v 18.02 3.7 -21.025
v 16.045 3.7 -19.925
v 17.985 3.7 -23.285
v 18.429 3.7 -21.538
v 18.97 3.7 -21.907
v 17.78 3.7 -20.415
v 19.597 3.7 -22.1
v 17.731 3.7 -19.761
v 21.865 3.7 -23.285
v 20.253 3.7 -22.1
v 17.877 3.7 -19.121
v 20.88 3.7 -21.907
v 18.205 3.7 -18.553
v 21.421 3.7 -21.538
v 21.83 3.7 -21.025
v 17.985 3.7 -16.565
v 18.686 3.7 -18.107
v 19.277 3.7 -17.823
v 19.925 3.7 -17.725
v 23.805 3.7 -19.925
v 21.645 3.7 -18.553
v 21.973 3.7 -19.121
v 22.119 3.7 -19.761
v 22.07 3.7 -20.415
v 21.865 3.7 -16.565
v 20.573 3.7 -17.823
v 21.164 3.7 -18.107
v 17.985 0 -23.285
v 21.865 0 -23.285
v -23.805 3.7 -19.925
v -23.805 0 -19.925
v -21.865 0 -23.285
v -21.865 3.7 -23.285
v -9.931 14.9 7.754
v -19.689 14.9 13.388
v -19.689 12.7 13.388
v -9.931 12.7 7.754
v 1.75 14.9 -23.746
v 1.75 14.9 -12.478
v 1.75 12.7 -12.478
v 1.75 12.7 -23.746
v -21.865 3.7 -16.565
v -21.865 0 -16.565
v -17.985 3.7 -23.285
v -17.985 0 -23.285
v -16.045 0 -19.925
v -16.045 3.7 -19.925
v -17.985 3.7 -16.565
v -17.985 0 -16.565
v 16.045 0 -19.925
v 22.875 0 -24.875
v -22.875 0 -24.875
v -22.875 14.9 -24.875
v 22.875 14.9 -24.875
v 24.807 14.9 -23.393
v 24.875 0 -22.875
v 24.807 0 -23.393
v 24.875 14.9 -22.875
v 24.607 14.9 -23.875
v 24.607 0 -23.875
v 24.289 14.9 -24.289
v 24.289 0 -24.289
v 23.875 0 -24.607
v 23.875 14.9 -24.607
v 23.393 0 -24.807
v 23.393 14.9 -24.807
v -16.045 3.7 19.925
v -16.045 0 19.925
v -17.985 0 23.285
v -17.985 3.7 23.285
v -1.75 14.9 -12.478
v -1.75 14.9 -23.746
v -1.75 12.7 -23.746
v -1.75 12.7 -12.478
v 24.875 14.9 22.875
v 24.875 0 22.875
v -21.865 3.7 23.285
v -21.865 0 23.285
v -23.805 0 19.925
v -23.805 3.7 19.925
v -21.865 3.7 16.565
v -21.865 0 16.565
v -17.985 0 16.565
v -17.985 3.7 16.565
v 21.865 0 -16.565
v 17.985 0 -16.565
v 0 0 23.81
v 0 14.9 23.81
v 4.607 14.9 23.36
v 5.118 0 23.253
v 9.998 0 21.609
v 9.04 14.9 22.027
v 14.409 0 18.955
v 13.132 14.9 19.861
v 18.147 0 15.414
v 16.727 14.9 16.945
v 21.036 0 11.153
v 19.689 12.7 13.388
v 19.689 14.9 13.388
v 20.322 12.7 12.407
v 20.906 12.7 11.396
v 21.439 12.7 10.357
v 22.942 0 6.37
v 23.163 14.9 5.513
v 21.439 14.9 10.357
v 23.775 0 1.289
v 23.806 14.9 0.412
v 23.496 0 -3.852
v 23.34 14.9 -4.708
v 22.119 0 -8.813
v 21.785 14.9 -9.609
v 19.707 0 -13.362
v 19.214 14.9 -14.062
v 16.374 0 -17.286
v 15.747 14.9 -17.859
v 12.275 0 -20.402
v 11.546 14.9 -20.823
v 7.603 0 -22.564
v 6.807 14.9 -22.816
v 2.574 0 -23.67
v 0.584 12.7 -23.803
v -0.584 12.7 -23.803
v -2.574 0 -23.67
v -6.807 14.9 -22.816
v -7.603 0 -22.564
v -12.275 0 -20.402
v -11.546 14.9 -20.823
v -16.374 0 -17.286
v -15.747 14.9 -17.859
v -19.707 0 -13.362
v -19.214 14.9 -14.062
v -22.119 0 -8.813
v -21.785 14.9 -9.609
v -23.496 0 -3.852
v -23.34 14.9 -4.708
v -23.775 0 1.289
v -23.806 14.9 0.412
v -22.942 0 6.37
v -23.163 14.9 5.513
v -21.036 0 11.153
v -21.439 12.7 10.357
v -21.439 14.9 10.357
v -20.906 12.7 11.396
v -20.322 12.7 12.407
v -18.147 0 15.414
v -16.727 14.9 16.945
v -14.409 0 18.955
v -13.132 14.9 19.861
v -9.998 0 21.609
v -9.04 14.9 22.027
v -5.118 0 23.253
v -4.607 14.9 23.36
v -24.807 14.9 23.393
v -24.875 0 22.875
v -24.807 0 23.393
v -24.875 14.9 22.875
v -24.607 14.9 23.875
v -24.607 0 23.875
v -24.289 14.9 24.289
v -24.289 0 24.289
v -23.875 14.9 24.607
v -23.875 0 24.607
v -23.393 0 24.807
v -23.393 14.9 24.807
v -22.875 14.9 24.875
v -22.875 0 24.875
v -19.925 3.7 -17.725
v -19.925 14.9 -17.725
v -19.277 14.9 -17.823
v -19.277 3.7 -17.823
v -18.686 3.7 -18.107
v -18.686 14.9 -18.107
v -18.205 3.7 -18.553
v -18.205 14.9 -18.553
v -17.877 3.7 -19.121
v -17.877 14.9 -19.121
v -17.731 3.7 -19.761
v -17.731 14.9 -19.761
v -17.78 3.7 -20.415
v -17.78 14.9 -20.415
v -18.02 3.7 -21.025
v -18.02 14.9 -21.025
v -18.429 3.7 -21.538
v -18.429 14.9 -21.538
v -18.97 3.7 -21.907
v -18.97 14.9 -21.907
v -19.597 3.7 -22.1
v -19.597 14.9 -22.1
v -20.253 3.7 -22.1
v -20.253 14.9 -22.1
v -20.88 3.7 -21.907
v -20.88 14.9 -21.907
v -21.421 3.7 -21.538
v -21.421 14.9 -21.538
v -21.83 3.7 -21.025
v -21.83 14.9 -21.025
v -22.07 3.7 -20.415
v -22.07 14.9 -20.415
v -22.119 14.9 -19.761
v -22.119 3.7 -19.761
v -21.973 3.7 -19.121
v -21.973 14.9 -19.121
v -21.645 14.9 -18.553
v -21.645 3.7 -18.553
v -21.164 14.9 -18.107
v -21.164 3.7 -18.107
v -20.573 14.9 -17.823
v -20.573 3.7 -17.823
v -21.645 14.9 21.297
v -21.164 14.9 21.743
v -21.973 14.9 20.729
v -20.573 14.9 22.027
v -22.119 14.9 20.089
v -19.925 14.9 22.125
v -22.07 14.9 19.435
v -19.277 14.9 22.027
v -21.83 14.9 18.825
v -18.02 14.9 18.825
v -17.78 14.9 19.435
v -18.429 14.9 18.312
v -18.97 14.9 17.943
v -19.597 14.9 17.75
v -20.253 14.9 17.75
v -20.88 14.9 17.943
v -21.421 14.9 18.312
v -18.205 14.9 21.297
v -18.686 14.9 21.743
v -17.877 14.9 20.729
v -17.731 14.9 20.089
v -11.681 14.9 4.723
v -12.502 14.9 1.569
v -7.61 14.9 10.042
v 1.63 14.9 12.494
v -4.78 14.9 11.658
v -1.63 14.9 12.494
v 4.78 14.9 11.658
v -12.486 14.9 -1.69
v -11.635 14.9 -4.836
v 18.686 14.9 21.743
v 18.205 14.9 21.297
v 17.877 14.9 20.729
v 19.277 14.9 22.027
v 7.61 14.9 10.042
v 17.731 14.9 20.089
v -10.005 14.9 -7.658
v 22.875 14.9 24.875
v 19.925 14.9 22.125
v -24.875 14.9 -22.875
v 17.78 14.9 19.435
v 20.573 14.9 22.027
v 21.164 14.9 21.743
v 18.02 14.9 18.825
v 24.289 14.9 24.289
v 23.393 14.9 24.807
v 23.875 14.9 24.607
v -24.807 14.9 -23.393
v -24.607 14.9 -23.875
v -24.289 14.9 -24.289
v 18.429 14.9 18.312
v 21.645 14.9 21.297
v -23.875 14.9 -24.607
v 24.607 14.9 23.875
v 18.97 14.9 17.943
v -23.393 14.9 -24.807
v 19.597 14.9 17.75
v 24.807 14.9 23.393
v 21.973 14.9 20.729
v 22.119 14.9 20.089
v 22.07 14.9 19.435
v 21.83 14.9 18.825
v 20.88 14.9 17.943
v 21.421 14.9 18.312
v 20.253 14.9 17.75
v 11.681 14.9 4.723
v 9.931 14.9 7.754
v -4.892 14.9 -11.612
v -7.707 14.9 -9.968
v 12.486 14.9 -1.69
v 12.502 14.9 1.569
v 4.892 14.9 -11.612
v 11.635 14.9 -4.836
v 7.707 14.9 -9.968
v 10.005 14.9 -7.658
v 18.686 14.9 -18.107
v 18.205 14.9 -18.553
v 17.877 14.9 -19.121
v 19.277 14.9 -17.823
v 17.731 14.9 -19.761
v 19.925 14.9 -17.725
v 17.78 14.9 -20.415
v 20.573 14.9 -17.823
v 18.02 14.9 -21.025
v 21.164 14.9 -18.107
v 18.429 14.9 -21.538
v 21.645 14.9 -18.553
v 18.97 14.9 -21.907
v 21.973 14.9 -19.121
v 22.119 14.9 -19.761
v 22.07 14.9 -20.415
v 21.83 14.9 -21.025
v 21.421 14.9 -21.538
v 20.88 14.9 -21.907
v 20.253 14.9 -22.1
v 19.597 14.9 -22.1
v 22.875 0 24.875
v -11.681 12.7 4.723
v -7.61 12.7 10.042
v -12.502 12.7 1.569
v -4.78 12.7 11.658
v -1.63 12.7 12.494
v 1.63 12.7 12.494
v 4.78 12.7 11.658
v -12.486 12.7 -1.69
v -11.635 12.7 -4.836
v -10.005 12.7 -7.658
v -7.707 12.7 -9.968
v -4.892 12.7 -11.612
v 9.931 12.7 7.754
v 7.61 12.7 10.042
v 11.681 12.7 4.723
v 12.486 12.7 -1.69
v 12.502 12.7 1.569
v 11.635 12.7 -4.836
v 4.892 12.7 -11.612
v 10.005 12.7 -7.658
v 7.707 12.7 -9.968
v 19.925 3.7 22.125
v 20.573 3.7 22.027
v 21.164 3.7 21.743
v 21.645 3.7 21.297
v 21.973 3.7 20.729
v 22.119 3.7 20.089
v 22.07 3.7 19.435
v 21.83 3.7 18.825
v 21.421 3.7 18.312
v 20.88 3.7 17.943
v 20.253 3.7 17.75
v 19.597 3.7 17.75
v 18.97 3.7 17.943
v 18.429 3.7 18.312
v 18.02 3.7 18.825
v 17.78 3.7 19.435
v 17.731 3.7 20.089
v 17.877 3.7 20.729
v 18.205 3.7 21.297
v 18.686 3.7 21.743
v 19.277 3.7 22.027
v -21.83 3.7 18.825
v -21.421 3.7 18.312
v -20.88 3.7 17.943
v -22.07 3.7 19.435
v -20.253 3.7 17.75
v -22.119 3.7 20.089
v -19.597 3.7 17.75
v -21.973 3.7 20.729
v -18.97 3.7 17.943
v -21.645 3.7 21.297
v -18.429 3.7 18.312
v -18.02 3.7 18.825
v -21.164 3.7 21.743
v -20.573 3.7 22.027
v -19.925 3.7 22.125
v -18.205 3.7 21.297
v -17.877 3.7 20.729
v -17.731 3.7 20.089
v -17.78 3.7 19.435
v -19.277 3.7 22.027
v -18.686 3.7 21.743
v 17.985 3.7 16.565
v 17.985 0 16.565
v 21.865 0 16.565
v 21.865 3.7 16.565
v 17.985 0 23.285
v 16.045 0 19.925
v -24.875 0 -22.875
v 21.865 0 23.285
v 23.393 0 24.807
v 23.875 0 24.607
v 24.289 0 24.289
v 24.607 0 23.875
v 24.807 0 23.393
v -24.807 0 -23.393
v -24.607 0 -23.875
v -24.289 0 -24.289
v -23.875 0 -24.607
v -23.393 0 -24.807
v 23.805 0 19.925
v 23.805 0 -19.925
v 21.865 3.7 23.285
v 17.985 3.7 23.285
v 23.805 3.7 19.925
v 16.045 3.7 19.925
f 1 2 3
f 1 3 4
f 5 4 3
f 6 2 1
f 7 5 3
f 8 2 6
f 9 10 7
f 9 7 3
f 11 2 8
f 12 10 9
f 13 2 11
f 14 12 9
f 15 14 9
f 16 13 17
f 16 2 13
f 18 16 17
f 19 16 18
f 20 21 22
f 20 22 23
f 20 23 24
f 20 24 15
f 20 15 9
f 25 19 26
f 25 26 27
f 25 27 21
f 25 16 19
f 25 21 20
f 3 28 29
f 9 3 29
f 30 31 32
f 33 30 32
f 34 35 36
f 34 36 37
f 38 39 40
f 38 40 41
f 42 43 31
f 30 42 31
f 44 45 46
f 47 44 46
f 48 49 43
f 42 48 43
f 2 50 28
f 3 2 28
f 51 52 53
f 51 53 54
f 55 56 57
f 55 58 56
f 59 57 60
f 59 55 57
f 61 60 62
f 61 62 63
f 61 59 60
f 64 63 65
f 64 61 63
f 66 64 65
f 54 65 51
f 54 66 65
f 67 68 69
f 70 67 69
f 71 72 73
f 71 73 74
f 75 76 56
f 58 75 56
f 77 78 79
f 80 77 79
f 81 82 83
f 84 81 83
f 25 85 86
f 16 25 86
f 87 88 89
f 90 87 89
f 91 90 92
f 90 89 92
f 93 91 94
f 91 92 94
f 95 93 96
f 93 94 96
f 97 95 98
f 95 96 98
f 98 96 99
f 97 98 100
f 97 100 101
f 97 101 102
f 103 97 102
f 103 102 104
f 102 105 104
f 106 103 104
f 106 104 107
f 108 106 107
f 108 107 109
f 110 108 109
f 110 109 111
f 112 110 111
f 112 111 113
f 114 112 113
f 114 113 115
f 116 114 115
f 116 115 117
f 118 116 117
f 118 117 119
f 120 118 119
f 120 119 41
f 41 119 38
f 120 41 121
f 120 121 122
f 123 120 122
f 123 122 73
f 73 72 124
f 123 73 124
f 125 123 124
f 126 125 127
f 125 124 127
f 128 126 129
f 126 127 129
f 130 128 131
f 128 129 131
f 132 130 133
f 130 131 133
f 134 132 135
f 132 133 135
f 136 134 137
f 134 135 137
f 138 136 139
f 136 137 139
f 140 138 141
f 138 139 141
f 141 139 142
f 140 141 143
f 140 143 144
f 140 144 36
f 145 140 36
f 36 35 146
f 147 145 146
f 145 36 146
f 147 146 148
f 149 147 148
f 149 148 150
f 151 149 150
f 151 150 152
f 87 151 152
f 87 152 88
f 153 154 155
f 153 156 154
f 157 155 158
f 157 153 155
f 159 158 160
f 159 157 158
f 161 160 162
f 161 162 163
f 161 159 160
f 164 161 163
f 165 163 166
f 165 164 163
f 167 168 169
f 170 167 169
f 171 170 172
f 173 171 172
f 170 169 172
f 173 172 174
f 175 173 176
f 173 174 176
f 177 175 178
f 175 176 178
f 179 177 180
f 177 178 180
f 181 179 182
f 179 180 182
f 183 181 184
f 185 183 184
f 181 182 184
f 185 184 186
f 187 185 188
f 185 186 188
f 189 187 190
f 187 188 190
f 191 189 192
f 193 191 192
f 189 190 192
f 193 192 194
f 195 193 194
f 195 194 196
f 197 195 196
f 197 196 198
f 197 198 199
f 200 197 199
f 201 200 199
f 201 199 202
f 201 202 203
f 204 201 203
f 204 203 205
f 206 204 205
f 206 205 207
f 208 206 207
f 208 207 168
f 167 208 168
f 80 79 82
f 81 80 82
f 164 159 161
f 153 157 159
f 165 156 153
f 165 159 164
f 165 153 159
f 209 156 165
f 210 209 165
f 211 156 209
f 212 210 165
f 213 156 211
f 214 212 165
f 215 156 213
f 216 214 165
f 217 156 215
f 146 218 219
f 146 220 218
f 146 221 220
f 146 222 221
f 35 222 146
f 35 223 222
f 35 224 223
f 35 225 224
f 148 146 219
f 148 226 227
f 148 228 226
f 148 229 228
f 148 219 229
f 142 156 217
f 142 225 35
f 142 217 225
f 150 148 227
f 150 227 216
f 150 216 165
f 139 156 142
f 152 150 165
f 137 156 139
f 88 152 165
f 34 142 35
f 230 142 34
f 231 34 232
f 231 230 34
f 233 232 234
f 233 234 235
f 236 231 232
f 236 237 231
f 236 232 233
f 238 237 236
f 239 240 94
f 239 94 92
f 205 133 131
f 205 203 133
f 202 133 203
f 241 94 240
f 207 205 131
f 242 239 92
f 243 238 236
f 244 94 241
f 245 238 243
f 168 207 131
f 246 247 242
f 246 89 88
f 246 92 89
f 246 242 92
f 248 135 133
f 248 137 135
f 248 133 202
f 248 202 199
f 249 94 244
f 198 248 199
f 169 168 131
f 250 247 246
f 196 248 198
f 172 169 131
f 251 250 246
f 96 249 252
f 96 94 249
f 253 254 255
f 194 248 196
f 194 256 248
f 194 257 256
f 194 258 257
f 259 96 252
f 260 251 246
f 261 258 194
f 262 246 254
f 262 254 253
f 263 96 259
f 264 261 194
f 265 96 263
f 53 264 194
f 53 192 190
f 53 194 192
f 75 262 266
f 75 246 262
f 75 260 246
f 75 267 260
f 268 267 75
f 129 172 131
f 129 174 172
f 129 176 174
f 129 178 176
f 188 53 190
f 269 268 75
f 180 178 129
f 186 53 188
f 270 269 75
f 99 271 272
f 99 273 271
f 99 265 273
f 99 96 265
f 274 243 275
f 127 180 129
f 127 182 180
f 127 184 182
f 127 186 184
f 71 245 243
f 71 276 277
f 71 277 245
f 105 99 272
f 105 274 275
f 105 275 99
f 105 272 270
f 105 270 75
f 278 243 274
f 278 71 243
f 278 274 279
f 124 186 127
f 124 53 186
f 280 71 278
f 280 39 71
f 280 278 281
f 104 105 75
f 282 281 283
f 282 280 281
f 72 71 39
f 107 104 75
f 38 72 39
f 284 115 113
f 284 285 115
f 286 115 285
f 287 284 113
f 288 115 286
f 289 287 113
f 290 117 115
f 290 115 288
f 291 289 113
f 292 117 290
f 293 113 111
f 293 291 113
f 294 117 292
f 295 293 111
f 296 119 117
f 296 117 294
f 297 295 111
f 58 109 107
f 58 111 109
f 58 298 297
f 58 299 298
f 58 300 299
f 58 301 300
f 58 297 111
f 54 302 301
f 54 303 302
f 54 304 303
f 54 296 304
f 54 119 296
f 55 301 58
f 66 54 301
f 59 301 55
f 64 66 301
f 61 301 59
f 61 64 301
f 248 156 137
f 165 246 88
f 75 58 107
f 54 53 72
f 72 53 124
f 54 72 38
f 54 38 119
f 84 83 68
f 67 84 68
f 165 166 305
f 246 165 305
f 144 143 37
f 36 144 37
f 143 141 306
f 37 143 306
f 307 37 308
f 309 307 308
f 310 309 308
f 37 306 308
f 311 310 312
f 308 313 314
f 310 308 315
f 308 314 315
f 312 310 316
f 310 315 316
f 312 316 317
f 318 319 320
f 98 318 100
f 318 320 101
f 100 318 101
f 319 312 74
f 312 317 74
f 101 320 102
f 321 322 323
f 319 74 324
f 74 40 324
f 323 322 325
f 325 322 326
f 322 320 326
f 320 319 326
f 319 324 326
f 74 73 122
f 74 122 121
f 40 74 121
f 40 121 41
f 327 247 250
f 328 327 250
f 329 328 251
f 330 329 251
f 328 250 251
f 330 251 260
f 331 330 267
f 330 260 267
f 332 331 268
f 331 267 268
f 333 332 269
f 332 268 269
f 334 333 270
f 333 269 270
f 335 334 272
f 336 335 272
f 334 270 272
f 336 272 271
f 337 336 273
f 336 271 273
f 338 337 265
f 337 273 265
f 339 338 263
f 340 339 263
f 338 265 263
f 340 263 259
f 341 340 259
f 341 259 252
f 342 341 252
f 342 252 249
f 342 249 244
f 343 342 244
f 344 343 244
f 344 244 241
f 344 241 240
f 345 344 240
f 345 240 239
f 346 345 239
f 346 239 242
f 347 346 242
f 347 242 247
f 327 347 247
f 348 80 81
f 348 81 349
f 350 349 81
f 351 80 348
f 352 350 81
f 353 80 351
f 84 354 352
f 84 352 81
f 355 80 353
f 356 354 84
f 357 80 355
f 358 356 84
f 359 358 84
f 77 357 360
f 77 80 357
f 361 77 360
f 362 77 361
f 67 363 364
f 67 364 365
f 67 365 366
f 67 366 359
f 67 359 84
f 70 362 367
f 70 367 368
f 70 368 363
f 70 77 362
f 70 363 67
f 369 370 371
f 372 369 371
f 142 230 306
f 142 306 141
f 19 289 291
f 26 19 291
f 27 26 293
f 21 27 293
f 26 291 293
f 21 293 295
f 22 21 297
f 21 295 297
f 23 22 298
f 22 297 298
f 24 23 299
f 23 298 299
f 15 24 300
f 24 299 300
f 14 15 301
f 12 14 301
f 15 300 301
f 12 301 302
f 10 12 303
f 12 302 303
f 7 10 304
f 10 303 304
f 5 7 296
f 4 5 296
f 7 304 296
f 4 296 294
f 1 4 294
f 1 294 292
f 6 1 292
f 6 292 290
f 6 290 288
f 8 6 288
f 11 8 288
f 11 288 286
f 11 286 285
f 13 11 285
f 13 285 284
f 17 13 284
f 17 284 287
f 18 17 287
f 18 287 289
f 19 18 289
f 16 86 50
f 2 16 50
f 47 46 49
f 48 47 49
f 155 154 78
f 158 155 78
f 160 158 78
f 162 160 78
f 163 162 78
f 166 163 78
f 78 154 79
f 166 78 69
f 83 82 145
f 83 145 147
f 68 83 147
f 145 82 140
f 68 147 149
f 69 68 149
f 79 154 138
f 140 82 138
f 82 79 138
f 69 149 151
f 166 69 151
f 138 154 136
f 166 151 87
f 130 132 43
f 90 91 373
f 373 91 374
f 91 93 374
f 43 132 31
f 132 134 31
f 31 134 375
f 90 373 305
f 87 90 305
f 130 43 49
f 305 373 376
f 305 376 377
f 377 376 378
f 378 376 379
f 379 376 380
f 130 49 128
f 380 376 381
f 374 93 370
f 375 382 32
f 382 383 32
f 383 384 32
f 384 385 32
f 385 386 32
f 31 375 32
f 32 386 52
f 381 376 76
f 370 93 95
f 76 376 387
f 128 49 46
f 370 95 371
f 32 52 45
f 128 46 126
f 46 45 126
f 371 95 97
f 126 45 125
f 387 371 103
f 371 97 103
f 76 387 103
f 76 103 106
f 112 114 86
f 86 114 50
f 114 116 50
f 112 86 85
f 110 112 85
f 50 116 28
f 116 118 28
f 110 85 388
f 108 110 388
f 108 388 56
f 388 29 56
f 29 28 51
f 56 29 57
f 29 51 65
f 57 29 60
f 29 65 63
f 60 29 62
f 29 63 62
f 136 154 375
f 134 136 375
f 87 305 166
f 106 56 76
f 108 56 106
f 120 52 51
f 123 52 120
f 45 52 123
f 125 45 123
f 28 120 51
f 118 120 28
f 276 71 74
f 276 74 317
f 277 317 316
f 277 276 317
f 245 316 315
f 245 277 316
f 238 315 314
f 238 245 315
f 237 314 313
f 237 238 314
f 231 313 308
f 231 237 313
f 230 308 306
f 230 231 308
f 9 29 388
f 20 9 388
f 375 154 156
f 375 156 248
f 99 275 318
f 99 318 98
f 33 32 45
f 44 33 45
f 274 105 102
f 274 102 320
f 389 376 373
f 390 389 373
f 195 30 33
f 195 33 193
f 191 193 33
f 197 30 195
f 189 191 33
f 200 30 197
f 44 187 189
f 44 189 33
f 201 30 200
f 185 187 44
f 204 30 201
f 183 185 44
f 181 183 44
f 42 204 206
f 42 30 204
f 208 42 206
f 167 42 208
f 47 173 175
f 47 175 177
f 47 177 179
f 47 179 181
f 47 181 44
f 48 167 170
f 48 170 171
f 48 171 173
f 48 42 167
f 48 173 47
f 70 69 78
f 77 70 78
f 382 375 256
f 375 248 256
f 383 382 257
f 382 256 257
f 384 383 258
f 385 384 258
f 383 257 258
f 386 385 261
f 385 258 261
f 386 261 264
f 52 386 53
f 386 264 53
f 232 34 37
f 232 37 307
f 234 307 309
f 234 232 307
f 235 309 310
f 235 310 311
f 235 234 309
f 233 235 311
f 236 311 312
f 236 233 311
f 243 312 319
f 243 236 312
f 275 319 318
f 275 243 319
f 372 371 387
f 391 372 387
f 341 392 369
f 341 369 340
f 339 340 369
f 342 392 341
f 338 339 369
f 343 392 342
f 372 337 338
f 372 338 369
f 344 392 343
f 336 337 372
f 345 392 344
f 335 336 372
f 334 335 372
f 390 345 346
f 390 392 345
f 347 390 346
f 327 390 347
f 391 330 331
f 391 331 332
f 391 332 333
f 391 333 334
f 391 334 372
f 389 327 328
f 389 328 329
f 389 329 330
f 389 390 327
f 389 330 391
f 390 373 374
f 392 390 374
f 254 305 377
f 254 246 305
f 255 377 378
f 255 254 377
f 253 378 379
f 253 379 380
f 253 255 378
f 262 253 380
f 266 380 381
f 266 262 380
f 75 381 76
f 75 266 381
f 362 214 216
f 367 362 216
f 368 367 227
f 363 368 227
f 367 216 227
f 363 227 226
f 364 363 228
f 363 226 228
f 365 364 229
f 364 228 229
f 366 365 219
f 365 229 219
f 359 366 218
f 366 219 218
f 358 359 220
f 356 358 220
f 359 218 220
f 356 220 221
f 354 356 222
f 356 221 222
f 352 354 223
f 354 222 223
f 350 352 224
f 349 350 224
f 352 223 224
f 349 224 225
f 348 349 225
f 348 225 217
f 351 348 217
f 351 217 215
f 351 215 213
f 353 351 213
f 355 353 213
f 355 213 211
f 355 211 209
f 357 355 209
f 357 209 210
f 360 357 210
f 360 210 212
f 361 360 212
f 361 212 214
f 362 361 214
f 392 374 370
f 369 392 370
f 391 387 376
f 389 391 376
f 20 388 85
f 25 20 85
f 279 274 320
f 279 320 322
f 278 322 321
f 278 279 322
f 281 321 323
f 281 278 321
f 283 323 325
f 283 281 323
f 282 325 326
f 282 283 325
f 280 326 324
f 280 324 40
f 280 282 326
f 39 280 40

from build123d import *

# Parameters (mm, degrees)
SKETCH1_W           = 49.75
SKETCH1_H           = 49.75
BOSS_EXTRUDE1_DEPTH = 14.9
FILLET1_R           = 2
SKETCH2_R           = 2.2
CUT_EXTRUDE1_DEPTH  = 14.9
CUT_EXTRUDE2_DEPTH  = 3.7
SKETCH4_R           = 23.81
CUT_EXTRUDE3_DEPTH  = 39.203942859
SKETCH5_R           = 12.6
BOSS_EXTRUDE2_DEPTH = 2.2


with BuildPart() as part:
    # Sketch1 → Boss-Extrude1 (new body)
    with BuildSketch(Plane(origin=(0, 0, 0), x_dir=(1, 0, 0), z_dir=(0, 1, 0))):
        Rectangle(SKETCH1_W, SKETCH1_H)
    extrude(amount=BOSS_EXTRUDE1_DEPTH)

    # Fillet1
    fillet1_edges = [part.edges().sort_by_distance(p)[0] for p in [
        (24.875, 7.45, 24.875),
        (-24.875, 7.45, 24.875),
        (-24.875, 7.45, -24.875),
        (24.875, 7.45, -24.875),
    ]]
    fillet(fillet1_edges, radius=FILLET1_R)

    # Sketch2 → Cut-Extrude1 (cut)
    with BuildSketch(Plane(origin=(0, 14.9, 0), x_dir=(1, 0, 0), z_dir=(0, 1, 0))):
        with Locations(Location((-19.925, 19.925, 0), (0, 0, 270))):
            Circle(SKETCH2_R)
        with Locations(Location((19.925, 19.925, 0), (0, 0, 270))):
            Circle(SKETCH2_R)
        with Locations(Location((19.925, -19.925, 0), (0, 0, 270))):
            Circle(SKETCH2_R)
        with Locations(Location((-19.925, -19.925, 0), (0, 0, 270))):
            Circle(SKETCH2_R)
    extrude(amount=-CUT_EXTRUDE1_DEPTH, mode=Mode.SUBTRACT)

    # Sketch3 → Cut-Extrude2 (cut)
    with BuildSketch(Plane.XZ):
        Polygon((-17.985103096, 23.285), (-21.864896904, 23.285), (-23.804793809, 19.925), (-21.864896904, 16.565), (-17.985103096, 16.565), (-16.045206191, 19.925), align=None)
        Polygon((17.985103096, 23.285), (16.045206191, 19.925), (17.985103096, 16.565), (21.864896904, 16.565), (23.804793809, 19.925), (21.864896904, 23.285), align=None)
        Polygon((17.985103096, -16.565), (16.045206191, -19.925), (17.985103096, -23.285), (21.864896904, -23.285), (23.804793809, -19.925), (21.864896904, -16.565), align=None)
        Polygon((-21.864896904, -16.565), (-23.804793809, -19.925), (-21.864896904, -23.285), (-17.985103096, -23.285), (-16.045206191, -19.925), (-17.985103096, -16.565), align=None)
    extrude(amount=-CUT_EXTRUDE2_DEPTH, mode=Mode.SUBTRACT)

    # Sketch4 → Cut-Extrude3 (cut, through all)
    with BuildSketch(Plane(origin=(0, 14.9, 0), x_dir=(1, 0, 0), z_dir=(0, 1, 0))):
        with Locations(Location((0, 0, 0), (0, 0, 270))):
            Circle(SKETCH4_R)
    extrude(amount=-CUT_EXTRUDE3_DEPTH, mode=Mode.SUBTRACT)

    # Sketch5 → Boss-Extrude2 (add)
    with BuildSketch(Plane(origin=(0, 14.9, 0), x_dir=(1, 0, 0), z_dir=(0, 1, 0))):
        with BuildLine():
            ThreePointArc((-1.75, 12.477880429), (0, 12.6), (1.75, 12.477880429))
            Line((1.75, 12.477880429), (1.75, 23.745601698))
            ThreePointArc((1.75, 23.745601698), (0, 23.81), (-1.75, 23.745601698))
            Line((-1.75, 23.745601698), (-1.75, 12.477880429))
        make_face()
        Circle(SKETCH5_R)
        with BuildLine():
            ThreePointArc((-9.931161437, -7.754484671), (-10.911920088, -6.3), (-11.681161437, -4.723395758))
            Line((-11.681161437, -4.723395758), (-21.439294299, -10.357256392))
            ThreePointArc((-21.439294299, -10.357256392), (-20.620064864, -11.905), (-19.689294299, -13.388345306))
            Line((-19.689294299, -13.388345306), (-9.931161437, -7.754484671))
        make_face()
        with BuildLine():
            Line((21.439294299, -10.357256392), (11.681161437, -4.723395758))
            ThreePointArc((11.681161437, -4.723395758), (10.911920088, -6.3), (9.931161437, -7.754484671))
            Line((9.931161437, -7.754484671), (19.689294299, -13.388345306))
            ThreePointArc((19.689294299, -13.388345306), (20.620064864, -11.905), (21.439294299, -10.357256392))
        make_face()
    extrude(amount=-BOSS_EXTRUDE2_DEPTH)


solid = part.part
